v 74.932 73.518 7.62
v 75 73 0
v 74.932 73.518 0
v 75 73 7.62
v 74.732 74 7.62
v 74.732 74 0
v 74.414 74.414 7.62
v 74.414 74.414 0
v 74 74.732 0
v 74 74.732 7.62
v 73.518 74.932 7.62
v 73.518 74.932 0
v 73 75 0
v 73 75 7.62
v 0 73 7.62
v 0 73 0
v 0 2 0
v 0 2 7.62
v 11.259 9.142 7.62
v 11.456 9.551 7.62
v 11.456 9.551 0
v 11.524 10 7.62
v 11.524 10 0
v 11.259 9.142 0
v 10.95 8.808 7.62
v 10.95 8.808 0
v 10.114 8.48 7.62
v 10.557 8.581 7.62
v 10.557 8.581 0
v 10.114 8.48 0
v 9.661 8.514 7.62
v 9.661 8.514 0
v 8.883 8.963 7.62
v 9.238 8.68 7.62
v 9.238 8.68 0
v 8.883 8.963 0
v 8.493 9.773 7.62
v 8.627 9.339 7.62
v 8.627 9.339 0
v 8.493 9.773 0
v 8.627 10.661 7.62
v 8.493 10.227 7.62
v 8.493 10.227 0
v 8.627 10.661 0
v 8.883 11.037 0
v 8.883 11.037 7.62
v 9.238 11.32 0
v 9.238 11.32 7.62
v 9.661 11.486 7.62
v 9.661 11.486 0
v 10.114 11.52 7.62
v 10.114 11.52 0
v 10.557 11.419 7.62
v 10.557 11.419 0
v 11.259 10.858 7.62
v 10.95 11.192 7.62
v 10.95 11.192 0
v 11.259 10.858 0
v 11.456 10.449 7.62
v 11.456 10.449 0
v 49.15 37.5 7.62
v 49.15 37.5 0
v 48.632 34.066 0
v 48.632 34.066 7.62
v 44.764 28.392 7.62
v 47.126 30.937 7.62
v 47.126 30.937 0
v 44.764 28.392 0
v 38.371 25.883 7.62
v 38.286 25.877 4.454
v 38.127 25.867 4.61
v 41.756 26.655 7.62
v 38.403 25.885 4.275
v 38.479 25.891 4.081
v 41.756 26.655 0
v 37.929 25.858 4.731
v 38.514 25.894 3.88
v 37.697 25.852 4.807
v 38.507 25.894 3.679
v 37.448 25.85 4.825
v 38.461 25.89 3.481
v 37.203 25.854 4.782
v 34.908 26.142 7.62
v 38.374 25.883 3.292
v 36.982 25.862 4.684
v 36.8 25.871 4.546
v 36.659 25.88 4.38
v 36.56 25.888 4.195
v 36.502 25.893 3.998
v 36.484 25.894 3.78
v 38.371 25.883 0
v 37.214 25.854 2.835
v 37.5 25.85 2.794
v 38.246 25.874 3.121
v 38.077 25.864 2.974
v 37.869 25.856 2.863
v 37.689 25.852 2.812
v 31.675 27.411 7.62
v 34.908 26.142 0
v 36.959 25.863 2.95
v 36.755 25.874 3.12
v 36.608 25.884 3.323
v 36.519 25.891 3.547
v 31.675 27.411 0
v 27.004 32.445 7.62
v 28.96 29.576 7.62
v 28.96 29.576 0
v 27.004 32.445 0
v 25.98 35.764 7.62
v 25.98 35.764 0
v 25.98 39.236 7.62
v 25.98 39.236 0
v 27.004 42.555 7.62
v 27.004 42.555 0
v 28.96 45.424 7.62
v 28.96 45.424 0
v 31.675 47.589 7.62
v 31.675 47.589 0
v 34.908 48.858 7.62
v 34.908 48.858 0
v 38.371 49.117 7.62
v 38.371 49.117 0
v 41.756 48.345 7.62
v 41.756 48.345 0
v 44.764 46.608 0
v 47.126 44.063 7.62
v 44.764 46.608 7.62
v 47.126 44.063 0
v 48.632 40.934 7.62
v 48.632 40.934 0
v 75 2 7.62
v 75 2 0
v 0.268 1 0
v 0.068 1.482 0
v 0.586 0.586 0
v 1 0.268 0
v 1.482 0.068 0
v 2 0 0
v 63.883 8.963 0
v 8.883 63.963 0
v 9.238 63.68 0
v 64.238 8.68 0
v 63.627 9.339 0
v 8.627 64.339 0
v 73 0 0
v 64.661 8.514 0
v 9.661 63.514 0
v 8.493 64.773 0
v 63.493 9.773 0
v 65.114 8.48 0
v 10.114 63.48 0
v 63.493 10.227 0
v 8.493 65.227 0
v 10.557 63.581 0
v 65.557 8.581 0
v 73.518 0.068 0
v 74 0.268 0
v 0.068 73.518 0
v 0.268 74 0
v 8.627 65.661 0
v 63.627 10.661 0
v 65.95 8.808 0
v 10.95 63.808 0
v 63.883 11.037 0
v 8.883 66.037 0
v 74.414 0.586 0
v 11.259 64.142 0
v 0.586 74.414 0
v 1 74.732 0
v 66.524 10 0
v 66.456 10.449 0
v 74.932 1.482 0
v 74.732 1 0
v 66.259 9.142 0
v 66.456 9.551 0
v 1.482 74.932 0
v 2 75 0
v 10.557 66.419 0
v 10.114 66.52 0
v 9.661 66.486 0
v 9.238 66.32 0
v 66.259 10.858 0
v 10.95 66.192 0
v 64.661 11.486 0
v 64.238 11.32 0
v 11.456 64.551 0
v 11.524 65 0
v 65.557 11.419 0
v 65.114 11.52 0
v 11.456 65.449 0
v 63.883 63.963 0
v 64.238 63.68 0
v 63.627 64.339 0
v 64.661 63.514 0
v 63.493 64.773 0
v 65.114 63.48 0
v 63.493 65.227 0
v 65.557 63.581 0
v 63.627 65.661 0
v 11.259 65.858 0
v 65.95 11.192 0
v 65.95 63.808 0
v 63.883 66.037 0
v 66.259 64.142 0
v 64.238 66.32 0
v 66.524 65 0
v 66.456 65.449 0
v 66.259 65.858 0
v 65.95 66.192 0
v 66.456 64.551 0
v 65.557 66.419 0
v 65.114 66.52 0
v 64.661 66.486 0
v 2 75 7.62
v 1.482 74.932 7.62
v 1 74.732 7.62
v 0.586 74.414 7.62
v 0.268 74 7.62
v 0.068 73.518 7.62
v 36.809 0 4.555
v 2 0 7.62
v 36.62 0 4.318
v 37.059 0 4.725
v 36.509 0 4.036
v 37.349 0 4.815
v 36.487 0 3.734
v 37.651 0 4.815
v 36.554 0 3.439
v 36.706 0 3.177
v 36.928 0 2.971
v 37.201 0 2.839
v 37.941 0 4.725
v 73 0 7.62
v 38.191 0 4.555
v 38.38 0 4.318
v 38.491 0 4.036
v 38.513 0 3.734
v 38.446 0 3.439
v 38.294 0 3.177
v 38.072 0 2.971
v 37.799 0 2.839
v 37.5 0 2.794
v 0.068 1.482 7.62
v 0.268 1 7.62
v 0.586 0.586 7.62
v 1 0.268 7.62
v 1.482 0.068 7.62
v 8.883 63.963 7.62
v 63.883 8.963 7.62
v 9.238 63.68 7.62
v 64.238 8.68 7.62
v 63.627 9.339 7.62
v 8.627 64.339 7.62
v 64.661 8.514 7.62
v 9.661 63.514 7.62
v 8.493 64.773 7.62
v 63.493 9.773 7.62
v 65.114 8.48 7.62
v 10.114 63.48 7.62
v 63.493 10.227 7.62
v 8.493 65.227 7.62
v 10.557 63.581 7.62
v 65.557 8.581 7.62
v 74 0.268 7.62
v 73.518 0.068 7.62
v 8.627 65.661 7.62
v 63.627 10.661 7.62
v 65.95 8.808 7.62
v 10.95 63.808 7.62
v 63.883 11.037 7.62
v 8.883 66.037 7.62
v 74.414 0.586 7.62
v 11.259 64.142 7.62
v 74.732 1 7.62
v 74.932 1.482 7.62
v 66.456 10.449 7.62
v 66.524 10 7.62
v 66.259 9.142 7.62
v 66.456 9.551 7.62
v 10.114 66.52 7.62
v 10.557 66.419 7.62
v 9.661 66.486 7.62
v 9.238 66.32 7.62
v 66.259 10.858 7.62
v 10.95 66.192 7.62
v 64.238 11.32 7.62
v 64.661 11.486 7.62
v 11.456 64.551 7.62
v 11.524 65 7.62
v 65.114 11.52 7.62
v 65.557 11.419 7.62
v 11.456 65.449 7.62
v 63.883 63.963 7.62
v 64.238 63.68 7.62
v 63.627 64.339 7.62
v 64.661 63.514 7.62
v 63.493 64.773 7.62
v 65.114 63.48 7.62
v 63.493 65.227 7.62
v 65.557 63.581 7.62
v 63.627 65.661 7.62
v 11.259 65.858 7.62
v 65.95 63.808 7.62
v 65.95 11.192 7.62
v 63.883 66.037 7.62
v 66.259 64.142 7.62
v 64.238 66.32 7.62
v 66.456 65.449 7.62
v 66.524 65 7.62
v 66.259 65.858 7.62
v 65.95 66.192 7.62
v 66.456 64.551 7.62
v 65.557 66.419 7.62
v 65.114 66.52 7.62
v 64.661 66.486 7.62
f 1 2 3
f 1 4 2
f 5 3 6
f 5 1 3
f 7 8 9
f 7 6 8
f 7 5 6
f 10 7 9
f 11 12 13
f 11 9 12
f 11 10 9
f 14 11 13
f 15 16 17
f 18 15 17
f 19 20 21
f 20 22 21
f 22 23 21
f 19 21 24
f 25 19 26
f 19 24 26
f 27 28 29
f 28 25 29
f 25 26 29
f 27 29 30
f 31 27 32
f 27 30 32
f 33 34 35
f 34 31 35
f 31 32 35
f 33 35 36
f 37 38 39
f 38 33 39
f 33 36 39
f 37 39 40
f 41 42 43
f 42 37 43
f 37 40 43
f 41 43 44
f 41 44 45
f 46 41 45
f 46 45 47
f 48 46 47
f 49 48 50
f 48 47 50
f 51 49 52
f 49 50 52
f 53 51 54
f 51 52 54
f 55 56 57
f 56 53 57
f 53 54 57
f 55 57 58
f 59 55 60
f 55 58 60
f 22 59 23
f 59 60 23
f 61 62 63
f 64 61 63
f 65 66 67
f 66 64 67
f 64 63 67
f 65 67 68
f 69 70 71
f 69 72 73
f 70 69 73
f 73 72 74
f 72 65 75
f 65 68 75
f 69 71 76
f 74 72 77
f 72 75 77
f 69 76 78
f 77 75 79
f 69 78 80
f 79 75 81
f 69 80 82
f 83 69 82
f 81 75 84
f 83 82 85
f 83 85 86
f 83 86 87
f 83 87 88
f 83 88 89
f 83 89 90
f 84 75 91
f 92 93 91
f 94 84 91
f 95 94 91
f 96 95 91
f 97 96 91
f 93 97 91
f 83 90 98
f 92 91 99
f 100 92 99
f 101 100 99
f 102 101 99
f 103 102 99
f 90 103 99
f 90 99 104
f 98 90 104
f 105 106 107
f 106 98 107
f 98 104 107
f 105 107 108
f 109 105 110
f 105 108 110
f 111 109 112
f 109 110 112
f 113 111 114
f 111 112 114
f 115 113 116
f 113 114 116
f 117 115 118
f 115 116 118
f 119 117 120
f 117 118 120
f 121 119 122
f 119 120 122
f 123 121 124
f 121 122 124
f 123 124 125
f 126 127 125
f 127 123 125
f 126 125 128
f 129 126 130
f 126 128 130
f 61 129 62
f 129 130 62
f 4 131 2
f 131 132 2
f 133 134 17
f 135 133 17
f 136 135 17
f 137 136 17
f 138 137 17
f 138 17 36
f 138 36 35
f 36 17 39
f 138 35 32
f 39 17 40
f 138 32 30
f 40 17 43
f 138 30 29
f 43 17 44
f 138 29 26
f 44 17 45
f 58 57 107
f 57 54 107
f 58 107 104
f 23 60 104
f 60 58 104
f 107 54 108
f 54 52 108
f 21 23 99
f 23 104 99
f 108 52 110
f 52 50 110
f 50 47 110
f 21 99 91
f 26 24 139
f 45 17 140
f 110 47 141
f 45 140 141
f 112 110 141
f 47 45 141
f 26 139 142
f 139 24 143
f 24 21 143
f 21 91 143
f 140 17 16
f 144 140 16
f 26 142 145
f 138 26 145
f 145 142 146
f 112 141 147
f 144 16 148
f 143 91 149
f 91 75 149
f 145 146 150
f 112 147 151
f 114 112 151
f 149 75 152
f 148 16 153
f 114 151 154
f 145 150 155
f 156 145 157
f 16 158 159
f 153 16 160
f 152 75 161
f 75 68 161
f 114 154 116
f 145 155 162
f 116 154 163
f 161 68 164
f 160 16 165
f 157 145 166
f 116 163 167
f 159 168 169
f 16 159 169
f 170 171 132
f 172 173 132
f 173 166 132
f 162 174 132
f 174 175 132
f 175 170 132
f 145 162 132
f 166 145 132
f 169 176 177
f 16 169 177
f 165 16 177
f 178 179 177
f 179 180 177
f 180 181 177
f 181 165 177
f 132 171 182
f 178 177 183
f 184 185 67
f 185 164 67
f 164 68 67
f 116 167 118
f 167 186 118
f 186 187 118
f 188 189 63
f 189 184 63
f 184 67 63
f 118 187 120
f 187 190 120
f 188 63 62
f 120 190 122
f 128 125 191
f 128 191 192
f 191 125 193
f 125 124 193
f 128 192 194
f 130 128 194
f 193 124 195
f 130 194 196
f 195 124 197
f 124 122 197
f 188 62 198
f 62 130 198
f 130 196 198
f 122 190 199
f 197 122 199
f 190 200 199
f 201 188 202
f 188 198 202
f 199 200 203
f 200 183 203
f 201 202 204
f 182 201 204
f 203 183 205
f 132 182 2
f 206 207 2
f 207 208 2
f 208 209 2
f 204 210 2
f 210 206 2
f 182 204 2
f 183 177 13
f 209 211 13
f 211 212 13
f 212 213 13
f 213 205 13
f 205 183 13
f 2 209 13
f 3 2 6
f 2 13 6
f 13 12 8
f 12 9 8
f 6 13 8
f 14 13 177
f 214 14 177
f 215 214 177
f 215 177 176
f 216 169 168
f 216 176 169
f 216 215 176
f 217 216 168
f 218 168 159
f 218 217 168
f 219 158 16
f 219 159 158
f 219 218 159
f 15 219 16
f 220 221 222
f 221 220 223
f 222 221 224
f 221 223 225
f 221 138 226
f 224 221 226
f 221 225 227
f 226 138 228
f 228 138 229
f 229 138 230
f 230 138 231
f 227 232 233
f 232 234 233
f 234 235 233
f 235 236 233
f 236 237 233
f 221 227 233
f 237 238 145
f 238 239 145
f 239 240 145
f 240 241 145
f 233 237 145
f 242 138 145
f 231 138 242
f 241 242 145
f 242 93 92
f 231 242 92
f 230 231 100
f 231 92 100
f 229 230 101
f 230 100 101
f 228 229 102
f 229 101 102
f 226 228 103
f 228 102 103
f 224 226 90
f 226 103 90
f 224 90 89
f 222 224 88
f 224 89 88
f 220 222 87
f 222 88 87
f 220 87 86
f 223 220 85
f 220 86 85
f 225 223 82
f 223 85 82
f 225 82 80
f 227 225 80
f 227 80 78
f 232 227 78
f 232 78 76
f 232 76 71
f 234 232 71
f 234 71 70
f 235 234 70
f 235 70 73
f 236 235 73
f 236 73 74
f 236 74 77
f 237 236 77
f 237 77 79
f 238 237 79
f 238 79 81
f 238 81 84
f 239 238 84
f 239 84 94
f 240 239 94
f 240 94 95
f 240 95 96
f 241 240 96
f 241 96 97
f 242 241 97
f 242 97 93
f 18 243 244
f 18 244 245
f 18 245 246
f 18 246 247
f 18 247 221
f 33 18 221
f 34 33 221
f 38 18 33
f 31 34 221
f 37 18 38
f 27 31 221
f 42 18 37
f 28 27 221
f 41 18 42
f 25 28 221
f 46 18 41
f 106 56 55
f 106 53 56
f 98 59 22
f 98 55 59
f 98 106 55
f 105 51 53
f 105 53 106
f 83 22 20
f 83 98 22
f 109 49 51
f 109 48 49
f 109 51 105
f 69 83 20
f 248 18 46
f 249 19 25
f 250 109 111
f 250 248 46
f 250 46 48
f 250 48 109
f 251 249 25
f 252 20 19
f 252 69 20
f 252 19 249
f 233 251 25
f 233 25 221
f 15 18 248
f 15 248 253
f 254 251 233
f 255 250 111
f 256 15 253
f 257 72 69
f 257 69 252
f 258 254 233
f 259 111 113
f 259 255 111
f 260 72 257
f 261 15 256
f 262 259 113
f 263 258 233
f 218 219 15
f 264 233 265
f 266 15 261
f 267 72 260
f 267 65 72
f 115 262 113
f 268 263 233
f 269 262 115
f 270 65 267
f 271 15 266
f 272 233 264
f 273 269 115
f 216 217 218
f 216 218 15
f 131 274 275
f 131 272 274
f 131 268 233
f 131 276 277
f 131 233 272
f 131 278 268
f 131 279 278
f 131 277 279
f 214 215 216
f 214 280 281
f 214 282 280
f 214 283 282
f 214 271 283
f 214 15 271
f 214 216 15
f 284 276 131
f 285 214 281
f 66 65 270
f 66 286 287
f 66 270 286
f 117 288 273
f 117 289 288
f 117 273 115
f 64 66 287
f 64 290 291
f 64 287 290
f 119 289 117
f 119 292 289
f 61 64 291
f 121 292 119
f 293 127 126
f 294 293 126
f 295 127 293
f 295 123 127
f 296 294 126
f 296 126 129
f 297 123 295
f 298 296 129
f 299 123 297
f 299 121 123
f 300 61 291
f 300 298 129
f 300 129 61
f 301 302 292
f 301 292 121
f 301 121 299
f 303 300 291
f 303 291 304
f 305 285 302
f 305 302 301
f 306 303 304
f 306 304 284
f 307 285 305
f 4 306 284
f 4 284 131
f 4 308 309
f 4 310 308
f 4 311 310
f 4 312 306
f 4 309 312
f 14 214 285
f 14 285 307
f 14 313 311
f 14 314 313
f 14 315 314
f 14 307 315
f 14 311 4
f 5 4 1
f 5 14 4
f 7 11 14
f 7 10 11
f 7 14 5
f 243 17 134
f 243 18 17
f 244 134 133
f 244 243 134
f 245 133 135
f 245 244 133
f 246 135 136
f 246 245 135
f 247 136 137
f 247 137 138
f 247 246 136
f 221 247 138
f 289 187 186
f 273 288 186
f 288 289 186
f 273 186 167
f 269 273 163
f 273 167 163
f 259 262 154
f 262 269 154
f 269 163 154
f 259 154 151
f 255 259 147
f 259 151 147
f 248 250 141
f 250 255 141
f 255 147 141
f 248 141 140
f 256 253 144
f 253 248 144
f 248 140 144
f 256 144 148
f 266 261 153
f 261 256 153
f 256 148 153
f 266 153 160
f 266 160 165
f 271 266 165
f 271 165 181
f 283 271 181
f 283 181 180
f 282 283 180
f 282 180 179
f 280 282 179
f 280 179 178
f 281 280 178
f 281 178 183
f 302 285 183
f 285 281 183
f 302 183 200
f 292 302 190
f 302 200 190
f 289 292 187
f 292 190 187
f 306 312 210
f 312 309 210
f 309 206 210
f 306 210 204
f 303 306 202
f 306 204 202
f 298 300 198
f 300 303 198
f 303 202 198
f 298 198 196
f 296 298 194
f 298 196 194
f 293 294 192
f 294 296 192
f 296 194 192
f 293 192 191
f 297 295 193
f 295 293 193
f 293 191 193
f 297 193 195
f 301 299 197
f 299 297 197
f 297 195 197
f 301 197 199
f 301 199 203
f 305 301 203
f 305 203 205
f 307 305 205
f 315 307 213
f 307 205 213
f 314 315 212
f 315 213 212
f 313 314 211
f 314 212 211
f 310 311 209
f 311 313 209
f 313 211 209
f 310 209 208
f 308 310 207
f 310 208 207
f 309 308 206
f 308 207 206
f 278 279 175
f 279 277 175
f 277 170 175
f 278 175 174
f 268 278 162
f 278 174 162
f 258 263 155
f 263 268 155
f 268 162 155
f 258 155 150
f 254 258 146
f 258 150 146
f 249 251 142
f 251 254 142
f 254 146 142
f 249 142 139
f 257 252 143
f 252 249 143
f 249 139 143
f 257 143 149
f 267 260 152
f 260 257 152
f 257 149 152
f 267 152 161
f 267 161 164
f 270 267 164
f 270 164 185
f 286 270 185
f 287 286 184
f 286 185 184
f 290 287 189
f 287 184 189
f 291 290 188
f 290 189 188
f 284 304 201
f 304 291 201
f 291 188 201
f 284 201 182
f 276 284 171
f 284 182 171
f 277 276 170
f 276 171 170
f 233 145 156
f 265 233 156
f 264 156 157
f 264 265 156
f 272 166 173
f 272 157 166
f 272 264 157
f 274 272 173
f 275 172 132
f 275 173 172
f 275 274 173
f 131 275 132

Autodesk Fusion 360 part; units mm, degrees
sketch "Sketch1" plane through (0, 0, 0) normal (0, 0, 1) x (1, 0, 0)
  line L0 (0, 0) -> (75, 0)
  line L1 (75, 0) -> (75, 75)
  line L2 (75, 75) -> (0, 75)
  line L3 (0, 75) -> (0, 0)
  circle A0 centre (37.5, 37.5) radius 11.65
  circle A1 centre (10, 65) radius 1.524
  circle A2 centre (65, 65) radius 1.524
  circle A3 centre (10, 10) radius 1.524
  circle A4 centre (65, 10) radius 1.524
  dimension "d1" = 75
  dimension "d2" = 75
  dimension "d3" = 37.5
  dimension "d4" = 37.5
  dimension "d5" = 23.3
  dimension "d6" = 3.048
  dimension "d7" = 10
  dimension "d8" = 10
  dimension "d9" = 10
  dimension "d10" = 10
  dimension "d11" = 10
  dimension "d12" = 10
  dimension "d13" = 10
  dimension "d14" = 10
extrude "Extrude1" add sketch "Sketch1" along normal blind 7.62
fillet "Fillet1" radius 2 4 edges at (75, 0, 3.81) (75, 75, 3.81) (0, 0, 3.81) (0, 75, 3.81)
sketch "Sketch2" plane through (0, 0, 0) normal (0, -1, 0) x (1, 0, 0)
  line L0 (2, 7.62) -> (2, 0)
  line L1 (2, 0) -> (73, 0)
  line L2 (73, 0) -> (73, 7.62)
  line L3 (73, 7.62) -> (2, 7.62)
  circle A0 centre (37.5, 3.81) radius 1.016
  dimension "d19" = 35.5
  dimension "d20" = 2.032
  dimension "d21" = 3.81
hole "Hole1" at (37.5, 0, 3.81) direction (0, 1, 0) diameter 2.032 depth 30 tip angle 118
